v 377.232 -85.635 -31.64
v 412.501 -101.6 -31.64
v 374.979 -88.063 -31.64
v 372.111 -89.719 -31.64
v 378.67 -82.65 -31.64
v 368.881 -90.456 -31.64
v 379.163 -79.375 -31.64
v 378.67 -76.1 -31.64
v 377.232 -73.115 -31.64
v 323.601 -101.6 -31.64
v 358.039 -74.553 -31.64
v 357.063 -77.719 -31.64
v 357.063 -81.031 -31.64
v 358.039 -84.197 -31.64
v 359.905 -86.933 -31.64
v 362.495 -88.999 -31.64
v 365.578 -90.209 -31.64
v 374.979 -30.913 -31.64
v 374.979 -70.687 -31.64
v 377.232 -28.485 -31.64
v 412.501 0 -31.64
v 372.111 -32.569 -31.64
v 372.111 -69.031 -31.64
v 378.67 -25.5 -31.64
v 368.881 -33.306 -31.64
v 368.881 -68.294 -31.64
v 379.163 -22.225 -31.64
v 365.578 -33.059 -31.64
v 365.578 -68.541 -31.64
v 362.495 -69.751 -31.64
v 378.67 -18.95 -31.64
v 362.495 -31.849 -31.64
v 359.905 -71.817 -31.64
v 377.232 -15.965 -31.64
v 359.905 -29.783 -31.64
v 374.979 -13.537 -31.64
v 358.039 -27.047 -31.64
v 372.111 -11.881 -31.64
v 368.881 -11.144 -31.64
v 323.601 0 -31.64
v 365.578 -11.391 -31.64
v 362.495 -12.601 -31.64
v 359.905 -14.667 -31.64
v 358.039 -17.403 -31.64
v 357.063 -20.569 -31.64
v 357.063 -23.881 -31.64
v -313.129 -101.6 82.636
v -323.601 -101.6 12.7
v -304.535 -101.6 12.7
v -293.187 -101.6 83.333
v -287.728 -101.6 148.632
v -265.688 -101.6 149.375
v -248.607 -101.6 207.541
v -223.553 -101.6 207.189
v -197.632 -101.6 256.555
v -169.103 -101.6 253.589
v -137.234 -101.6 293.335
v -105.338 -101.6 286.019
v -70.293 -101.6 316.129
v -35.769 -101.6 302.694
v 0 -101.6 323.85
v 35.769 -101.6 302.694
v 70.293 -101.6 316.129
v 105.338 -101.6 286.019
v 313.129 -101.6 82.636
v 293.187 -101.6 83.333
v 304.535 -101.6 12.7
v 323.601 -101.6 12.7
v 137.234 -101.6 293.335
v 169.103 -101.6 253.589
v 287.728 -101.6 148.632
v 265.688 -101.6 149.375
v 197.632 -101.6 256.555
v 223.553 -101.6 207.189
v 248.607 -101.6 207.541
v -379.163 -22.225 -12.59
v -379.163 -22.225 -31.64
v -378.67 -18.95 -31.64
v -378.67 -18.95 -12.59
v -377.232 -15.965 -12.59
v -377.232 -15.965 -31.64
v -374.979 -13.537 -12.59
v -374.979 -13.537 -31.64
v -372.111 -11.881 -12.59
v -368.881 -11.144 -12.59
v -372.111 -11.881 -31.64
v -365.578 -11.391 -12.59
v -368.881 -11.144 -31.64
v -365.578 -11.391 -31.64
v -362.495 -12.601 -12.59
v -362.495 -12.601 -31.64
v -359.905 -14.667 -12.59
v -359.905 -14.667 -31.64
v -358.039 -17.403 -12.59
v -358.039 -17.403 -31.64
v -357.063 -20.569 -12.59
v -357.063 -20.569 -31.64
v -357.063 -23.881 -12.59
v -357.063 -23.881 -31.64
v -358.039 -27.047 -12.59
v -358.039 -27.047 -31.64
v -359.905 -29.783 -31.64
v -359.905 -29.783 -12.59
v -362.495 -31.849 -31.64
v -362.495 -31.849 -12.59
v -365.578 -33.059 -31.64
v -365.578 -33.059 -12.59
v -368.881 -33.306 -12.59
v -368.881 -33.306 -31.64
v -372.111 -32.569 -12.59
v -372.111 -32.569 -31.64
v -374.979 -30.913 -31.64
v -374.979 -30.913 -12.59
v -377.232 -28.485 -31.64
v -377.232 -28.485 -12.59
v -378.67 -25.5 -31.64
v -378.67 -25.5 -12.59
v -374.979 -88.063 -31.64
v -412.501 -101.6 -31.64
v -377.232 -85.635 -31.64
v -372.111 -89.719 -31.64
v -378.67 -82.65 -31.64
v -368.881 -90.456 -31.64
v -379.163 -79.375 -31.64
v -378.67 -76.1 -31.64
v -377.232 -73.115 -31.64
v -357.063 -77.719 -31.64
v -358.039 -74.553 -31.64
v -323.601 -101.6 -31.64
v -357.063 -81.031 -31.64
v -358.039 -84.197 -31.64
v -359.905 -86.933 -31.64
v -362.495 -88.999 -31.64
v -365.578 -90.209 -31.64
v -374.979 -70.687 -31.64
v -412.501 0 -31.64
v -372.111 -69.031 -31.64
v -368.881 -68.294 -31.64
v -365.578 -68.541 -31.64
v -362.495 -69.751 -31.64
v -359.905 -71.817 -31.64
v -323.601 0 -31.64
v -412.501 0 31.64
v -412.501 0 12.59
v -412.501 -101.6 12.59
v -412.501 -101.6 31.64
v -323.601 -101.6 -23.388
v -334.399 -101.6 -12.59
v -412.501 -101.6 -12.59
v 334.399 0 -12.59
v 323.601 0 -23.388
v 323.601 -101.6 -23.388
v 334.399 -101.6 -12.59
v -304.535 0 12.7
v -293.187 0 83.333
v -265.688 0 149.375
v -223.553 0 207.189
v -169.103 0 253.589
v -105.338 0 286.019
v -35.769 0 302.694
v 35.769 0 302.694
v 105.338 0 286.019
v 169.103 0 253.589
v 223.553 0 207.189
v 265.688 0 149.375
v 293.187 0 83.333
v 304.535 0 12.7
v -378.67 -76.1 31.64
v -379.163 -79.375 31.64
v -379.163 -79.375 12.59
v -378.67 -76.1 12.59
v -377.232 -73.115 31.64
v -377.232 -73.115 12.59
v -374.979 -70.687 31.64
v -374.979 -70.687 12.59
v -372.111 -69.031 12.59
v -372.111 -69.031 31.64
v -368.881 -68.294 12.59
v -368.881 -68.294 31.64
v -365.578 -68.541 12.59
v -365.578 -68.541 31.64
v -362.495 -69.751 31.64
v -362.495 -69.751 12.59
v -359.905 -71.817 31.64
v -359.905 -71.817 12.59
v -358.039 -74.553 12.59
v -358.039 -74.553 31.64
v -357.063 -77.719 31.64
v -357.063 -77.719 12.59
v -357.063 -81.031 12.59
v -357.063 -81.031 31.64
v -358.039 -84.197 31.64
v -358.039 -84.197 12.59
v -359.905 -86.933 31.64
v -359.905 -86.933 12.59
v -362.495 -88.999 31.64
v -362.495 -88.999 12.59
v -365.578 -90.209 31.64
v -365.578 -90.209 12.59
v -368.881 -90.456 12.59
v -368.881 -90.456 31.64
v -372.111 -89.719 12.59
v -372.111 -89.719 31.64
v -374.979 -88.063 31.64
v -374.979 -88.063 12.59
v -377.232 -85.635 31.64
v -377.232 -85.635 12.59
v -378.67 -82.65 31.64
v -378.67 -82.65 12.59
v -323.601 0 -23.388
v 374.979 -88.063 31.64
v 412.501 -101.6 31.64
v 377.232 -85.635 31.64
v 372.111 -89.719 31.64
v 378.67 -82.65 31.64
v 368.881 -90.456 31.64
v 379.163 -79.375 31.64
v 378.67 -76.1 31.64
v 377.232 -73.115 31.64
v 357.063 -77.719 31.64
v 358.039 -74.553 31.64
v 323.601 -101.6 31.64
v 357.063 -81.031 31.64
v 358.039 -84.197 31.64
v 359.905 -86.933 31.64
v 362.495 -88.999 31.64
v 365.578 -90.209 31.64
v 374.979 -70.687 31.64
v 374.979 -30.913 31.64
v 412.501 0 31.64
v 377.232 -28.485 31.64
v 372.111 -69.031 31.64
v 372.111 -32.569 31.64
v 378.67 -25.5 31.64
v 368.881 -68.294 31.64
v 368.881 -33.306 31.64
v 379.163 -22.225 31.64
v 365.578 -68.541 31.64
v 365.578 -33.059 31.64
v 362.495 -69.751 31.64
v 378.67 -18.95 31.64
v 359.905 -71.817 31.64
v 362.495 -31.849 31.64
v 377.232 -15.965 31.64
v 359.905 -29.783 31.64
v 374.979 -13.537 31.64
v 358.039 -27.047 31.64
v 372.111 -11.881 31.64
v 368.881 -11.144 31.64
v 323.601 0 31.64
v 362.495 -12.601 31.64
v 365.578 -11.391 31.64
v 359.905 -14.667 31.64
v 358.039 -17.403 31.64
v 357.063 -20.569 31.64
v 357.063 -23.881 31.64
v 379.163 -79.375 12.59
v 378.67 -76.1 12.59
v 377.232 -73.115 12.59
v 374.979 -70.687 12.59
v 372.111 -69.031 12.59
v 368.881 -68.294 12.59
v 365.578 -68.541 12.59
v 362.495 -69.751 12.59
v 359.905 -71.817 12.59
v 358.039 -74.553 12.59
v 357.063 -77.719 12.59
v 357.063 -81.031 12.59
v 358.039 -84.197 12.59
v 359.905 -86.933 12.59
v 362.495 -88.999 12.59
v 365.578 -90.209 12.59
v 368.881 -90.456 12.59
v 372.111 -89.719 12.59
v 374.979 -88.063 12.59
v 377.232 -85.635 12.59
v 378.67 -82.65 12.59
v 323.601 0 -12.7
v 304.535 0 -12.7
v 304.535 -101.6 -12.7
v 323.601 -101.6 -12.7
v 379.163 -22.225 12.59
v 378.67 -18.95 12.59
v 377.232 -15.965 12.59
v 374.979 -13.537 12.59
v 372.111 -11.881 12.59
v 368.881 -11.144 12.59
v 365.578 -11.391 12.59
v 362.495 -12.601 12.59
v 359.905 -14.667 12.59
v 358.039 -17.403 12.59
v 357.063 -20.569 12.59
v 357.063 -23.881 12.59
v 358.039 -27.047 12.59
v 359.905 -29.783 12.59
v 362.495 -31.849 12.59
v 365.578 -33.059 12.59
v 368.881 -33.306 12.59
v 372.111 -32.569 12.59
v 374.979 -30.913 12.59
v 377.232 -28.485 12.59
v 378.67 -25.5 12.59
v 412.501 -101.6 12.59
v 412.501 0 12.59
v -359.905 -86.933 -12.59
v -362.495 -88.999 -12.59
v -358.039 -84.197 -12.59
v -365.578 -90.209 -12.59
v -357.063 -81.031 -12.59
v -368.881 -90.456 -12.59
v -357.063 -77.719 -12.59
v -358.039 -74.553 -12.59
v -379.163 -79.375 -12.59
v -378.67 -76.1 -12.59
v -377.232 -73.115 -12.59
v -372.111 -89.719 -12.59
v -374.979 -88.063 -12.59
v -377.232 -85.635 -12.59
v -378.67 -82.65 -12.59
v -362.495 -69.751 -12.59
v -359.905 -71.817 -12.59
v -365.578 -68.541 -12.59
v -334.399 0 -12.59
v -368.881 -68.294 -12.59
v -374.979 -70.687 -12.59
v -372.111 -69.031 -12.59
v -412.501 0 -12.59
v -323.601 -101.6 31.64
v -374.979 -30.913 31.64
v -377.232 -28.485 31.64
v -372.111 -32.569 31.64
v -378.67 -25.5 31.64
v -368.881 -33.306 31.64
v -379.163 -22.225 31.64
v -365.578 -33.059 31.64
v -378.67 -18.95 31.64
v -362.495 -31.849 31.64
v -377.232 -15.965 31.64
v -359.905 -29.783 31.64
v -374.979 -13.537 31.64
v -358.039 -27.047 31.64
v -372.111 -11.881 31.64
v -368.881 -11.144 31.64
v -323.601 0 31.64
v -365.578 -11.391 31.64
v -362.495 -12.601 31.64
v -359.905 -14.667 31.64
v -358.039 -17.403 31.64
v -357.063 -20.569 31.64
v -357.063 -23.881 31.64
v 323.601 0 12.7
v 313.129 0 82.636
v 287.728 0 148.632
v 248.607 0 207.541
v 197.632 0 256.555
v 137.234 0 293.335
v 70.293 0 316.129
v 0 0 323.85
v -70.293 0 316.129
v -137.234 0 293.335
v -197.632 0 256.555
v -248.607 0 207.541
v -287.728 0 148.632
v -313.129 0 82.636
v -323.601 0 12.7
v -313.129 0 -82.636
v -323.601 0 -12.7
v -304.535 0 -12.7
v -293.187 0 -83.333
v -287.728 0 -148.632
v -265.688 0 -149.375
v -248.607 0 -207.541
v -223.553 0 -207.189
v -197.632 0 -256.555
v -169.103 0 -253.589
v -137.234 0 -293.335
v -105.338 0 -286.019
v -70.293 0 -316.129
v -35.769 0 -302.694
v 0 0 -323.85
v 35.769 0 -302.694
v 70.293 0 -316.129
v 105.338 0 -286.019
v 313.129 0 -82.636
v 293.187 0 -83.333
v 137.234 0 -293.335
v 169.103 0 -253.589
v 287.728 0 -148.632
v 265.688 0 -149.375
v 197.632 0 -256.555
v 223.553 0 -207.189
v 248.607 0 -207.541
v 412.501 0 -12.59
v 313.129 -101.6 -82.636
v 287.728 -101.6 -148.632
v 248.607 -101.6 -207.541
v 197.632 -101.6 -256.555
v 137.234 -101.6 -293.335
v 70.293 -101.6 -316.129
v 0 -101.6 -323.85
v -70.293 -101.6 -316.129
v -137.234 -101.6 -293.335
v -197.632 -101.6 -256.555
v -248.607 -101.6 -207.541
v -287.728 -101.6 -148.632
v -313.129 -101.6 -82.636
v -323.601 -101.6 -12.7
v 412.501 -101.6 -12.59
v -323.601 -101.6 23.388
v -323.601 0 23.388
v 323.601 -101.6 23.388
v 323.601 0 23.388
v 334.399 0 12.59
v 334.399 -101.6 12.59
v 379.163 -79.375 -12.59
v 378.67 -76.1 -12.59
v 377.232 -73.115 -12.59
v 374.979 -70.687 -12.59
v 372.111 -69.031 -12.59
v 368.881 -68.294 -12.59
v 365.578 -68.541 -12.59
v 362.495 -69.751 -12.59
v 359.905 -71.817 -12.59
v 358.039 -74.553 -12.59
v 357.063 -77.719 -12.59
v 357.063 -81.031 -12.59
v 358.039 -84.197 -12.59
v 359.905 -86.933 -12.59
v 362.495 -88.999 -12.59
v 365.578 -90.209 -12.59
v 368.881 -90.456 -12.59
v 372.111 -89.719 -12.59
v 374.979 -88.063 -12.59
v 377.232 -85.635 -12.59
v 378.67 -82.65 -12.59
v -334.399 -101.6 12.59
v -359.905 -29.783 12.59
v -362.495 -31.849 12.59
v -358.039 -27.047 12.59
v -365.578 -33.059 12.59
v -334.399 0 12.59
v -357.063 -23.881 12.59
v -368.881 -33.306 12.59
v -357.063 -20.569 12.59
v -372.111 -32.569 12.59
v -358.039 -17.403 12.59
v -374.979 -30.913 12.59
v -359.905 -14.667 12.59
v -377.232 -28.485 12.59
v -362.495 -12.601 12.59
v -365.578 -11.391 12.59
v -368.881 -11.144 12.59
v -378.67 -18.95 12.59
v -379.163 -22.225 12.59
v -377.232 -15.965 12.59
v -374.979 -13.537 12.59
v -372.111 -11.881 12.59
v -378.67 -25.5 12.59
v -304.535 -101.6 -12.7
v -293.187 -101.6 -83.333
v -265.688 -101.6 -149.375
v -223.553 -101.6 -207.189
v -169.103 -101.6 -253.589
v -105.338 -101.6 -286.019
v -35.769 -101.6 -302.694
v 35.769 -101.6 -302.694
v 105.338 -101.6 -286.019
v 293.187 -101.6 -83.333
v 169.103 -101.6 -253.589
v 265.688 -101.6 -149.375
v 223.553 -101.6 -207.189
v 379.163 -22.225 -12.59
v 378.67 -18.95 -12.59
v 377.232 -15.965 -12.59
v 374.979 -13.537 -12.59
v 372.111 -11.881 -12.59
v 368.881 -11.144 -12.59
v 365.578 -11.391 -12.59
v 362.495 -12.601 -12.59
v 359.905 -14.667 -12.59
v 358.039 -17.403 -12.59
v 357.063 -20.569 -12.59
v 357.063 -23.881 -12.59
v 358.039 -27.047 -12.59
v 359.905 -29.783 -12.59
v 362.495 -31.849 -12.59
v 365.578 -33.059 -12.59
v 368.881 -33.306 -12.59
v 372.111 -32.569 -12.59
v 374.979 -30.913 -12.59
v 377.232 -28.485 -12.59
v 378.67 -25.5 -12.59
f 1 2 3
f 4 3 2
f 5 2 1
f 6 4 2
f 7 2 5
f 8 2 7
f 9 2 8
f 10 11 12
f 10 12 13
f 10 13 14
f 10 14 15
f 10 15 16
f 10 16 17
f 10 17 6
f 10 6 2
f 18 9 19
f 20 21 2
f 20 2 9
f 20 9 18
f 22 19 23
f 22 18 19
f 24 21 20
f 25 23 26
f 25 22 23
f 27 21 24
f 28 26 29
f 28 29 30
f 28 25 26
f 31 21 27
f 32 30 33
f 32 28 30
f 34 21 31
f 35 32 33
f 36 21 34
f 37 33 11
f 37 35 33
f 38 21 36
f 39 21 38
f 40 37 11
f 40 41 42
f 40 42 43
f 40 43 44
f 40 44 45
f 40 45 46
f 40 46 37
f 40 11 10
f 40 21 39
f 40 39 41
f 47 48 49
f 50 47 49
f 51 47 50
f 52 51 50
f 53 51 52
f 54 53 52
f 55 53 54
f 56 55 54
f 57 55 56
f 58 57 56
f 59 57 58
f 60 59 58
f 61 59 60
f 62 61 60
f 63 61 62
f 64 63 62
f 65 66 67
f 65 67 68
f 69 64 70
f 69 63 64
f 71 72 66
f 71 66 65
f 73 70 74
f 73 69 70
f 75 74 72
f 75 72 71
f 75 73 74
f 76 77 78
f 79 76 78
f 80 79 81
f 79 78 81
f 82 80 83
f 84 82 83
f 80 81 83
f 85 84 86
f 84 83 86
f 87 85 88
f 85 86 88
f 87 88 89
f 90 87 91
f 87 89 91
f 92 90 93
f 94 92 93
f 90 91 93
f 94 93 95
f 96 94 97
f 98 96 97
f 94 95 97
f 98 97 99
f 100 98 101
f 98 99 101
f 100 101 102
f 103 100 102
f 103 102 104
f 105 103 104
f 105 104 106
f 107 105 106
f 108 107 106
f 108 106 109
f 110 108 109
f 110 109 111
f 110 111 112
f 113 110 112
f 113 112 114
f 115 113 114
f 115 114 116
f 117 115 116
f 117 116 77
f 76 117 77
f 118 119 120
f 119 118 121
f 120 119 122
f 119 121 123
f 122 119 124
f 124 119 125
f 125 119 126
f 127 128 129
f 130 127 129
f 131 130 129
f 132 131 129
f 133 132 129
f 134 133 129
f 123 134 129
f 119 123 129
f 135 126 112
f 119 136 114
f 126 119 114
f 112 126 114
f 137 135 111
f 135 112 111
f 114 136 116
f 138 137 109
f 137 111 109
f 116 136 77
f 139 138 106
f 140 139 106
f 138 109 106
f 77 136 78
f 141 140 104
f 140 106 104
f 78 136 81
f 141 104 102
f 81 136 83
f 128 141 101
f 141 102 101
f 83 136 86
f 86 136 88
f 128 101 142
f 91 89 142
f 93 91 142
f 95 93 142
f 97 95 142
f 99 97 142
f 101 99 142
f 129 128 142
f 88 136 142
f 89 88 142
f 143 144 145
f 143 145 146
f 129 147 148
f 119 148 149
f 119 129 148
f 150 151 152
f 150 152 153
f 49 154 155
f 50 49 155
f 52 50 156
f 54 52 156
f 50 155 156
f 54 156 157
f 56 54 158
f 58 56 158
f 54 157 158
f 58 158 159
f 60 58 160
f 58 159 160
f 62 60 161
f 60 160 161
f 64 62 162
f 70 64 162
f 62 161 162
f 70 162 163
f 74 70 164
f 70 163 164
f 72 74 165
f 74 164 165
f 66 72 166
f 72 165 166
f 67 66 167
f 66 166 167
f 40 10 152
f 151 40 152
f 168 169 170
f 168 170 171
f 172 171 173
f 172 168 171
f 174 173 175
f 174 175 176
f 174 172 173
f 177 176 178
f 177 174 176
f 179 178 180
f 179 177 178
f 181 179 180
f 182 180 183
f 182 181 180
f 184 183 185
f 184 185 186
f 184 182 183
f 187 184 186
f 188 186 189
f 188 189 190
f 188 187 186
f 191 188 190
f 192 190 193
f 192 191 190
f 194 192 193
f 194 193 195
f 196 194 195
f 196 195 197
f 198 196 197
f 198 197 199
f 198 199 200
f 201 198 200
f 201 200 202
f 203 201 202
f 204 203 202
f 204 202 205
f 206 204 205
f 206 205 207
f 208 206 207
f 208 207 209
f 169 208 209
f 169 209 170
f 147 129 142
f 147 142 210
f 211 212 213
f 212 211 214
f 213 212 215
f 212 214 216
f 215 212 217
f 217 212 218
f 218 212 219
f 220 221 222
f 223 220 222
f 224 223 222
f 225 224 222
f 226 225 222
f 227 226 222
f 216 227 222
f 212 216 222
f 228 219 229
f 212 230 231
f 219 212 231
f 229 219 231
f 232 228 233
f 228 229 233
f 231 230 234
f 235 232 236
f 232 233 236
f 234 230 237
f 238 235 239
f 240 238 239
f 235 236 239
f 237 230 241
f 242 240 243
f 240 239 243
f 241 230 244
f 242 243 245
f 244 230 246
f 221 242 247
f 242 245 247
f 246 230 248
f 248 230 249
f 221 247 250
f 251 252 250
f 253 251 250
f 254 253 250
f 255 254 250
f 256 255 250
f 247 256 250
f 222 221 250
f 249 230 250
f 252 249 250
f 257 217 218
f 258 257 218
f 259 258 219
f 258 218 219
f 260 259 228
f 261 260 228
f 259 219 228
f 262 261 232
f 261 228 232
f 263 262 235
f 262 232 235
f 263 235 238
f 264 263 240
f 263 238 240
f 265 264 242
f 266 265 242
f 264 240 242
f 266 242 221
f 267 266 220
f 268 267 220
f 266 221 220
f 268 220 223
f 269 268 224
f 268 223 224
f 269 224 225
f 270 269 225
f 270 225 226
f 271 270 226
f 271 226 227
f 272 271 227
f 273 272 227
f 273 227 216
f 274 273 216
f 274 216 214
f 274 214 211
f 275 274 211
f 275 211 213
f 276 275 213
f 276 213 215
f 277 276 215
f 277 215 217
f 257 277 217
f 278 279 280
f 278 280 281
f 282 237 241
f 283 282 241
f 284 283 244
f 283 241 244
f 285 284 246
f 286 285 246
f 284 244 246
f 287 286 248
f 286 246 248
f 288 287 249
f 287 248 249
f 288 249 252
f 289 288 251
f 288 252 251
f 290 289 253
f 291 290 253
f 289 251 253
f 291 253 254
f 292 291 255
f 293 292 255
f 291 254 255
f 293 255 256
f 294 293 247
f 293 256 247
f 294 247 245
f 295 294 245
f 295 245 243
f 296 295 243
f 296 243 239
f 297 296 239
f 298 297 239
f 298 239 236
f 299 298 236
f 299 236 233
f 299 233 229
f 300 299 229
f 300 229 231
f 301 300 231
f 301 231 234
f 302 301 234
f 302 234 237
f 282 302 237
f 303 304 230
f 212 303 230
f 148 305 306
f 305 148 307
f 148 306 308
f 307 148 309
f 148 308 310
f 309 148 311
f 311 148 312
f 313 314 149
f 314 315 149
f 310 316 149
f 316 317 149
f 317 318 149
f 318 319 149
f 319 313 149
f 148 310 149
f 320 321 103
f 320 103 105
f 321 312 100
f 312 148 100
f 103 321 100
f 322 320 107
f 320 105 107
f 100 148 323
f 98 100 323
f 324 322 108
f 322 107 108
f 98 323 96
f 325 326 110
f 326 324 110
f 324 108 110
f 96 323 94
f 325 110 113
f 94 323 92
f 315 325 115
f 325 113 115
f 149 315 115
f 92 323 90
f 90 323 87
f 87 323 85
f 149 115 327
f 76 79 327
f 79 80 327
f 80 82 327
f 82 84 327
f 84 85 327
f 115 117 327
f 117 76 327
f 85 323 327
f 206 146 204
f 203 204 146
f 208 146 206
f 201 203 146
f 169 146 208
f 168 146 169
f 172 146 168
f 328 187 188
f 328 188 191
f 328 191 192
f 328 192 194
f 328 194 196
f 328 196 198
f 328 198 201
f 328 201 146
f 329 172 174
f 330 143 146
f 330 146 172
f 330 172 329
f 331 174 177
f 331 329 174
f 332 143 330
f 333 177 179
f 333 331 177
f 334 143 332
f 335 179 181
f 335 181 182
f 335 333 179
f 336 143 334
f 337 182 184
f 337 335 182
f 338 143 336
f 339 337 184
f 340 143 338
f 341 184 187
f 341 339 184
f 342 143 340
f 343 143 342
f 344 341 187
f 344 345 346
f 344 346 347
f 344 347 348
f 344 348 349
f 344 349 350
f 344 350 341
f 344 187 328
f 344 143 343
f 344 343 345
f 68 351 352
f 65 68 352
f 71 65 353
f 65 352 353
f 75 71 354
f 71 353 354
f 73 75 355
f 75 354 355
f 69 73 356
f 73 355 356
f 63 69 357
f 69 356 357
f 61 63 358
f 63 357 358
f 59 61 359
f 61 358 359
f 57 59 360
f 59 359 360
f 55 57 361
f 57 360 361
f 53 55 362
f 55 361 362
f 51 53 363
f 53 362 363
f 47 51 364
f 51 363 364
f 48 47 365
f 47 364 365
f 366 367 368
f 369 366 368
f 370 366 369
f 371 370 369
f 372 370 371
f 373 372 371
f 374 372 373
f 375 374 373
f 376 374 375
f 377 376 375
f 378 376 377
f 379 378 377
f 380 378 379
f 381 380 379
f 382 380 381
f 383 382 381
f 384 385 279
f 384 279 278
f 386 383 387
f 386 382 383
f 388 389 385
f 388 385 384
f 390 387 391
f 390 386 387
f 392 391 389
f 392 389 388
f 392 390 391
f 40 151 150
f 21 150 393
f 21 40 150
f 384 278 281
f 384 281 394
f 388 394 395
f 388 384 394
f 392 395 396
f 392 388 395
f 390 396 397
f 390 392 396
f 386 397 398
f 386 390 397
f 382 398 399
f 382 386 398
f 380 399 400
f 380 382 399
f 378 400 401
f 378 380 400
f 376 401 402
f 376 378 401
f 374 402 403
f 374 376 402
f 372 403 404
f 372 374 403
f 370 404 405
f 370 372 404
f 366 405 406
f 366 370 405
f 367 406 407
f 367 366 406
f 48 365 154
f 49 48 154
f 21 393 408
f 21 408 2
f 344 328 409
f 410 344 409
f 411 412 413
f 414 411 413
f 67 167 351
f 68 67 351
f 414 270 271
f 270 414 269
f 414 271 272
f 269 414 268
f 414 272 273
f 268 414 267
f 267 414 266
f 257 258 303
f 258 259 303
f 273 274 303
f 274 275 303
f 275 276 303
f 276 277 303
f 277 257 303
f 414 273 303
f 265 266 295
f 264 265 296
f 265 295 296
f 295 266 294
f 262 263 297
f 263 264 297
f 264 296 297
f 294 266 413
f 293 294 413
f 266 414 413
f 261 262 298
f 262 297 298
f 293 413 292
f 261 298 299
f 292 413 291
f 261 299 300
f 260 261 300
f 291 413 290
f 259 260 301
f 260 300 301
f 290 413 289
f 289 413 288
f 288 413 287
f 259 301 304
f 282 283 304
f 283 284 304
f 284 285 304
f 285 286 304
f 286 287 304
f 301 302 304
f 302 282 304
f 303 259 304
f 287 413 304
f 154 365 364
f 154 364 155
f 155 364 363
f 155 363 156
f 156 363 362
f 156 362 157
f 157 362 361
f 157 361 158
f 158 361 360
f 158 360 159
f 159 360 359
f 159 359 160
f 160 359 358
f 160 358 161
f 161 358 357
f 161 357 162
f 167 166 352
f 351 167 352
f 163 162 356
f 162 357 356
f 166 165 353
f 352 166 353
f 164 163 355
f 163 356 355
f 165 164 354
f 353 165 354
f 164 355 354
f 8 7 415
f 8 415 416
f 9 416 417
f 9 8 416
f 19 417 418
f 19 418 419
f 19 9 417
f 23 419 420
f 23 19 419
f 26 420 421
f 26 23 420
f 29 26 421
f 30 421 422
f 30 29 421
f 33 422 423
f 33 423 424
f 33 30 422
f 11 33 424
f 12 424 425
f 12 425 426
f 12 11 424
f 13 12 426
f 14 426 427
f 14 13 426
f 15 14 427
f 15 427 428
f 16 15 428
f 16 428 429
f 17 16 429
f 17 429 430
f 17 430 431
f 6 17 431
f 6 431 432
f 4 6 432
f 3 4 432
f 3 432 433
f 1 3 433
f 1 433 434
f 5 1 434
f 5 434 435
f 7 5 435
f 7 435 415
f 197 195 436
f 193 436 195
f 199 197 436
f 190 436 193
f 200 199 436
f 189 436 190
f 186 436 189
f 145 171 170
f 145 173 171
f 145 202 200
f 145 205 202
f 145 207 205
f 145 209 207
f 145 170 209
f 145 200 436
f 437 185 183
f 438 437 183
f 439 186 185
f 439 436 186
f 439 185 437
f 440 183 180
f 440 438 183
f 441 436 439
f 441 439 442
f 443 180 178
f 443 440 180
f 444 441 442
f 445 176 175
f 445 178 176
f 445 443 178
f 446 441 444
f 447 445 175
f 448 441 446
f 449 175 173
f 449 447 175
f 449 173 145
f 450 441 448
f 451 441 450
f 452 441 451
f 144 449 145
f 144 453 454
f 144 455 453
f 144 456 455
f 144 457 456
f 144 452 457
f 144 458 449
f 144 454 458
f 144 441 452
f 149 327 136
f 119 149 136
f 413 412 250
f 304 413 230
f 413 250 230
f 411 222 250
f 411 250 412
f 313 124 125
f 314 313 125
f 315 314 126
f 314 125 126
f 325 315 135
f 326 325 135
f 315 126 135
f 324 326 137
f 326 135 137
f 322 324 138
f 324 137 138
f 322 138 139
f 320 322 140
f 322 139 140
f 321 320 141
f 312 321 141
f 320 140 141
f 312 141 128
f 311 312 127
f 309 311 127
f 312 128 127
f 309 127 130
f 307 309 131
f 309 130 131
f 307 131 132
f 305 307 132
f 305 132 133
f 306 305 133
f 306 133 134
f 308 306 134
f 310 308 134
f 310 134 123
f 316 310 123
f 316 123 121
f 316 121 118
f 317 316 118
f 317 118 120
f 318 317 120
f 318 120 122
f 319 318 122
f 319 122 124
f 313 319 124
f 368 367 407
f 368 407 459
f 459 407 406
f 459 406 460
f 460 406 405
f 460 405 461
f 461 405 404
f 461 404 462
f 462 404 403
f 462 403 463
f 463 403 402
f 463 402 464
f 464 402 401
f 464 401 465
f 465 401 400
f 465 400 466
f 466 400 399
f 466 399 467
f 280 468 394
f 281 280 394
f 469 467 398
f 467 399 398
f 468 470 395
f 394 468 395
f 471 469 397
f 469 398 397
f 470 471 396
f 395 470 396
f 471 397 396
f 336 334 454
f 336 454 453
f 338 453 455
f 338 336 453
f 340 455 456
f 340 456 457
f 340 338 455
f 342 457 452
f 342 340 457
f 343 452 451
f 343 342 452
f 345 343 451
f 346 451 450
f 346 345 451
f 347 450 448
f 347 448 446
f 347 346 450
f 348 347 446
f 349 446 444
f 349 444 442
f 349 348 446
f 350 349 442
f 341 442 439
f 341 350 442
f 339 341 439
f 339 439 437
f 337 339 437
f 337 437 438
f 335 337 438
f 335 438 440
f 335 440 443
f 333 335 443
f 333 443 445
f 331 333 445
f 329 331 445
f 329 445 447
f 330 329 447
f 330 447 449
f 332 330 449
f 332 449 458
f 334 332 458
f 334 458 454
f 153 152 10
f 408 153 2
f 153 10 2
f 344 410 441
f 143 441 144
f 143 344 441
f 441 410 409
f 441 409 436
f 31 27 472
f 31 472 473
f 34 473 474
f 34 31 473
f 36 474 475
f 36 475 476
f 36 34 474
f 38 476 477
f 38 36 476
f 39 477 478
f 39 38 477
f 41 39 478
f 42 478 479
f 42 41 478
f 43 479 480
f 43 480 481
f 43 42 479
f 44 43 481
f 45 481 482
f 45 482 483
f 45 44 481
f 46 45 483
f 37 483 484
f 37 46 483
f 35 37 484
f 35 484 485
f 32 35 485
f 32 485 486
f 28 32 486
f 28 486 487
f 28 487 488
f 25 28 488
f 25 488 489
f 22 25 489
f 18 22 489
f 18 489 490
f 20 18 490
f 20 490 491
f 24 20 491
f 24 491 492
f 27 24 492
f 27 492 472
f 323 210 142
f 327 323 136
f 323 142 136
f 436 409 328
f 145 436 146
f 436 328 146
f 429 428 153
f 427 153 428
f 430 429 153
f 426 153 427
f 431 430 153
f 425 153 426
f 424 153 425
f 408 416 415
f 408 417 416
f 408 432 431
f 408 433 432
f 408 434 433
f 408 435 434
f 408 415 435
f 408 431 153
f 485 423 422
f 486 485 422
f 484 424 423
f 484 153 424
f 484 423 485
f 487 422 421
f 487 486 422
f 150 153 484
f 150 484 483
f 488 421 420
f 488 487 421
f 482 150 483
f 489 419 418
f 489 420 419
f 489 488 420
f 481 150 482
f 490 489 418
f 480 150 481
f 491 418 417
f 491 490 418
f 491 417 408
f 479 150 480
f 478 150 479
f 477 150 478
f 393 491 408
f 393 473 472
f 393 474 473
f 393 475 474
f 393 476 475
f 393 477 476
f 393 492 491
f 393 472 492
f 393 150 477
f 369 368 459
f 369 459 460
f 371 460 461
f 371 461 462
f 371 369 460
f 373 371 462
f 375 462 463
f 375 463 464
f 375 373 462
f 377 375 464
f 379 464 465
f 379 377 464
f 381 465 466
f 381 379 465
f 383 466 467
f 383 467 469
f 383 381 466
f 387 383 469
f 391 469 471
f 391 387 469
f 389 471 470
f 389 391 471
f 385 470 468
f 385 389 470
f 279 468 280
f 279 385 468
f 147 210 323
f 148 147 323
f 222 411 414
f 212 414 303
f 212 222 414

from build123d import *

# Parameters (mm, degrees)
F1_DEPTH = 101.6
F5_DEPTH = 101.6
F6_R     = 11.1125
F7_DEPTH = 25.4


# Not quite as in the source:
# - a feature of the source that left no trace in its solid (it failed there, or was rolled back) is left out


with BuildPart() as f1:
    # F0 (on Front) → F1 (new body)
    with BuildSketch(Plane.XZ):
        with BuildLine():
            ThreePointArc((-304.5353017304, 12.7), (0, 304.8), (304.5353017304, 12.7))
            Line((304.5353017304, 12.7), (323.6008845785, 12.7))
            ThreePointArc((323.6008845785, 12.7), (0, 323.85), (-323.6008845785, 12.7))
            Line((-323.6008845785, 12.7), (-304.5353017304, 12.7))
        make_face()
    extrude(amount=F1_DEPTH)


with BuildPart() as f2_1:
    # F2: instance of F1
    add(f1.part.mirror(Plane.XY))


with BuildPart() as f5:
    # F3 (on Front) → F5 (new body)
    with BuildSketch(Plane.XZ):
        Polygon((323.6008845785, 31.6401058242), (323.6008845785, 23.3883168548), (334.3990956091, 12.5901058242), (412.5008845785, 12.5901058242), (412.5008845785, 31.6401058242), align=None)
    extrude(amount=F5_DEPTH)

    # F6 (on face) → F7 (cut)
    with BuildSketch(Plane.XY.offset(31.6401058242)):
        with Locations((368.0508845785, -22.225)):
            Circle(F6_R)
        with Locations((368.0508845785, -79.375)):
            Circle(F6_R)
    extrude(amount=-F7_DEPTH, mode=Mode.SUBTRACT)


with BuildPart() as f8_1:
    # F8: instance of F5
    add(f5.part.mirror(Plane.YZ))


with BuildPart() as f9_1:
    # F9: instance of F8_1
    add(f8_1.part.mirror(Plane.XY))


with BuildPart() as f9_2:
    # F9: instance of F5
    add(f5.part.mirror(Plane.XY))


solid = Compound([f1.part, f2_1.part, f5.part, f8_1.part, f9_1.part, f9_2.part])
